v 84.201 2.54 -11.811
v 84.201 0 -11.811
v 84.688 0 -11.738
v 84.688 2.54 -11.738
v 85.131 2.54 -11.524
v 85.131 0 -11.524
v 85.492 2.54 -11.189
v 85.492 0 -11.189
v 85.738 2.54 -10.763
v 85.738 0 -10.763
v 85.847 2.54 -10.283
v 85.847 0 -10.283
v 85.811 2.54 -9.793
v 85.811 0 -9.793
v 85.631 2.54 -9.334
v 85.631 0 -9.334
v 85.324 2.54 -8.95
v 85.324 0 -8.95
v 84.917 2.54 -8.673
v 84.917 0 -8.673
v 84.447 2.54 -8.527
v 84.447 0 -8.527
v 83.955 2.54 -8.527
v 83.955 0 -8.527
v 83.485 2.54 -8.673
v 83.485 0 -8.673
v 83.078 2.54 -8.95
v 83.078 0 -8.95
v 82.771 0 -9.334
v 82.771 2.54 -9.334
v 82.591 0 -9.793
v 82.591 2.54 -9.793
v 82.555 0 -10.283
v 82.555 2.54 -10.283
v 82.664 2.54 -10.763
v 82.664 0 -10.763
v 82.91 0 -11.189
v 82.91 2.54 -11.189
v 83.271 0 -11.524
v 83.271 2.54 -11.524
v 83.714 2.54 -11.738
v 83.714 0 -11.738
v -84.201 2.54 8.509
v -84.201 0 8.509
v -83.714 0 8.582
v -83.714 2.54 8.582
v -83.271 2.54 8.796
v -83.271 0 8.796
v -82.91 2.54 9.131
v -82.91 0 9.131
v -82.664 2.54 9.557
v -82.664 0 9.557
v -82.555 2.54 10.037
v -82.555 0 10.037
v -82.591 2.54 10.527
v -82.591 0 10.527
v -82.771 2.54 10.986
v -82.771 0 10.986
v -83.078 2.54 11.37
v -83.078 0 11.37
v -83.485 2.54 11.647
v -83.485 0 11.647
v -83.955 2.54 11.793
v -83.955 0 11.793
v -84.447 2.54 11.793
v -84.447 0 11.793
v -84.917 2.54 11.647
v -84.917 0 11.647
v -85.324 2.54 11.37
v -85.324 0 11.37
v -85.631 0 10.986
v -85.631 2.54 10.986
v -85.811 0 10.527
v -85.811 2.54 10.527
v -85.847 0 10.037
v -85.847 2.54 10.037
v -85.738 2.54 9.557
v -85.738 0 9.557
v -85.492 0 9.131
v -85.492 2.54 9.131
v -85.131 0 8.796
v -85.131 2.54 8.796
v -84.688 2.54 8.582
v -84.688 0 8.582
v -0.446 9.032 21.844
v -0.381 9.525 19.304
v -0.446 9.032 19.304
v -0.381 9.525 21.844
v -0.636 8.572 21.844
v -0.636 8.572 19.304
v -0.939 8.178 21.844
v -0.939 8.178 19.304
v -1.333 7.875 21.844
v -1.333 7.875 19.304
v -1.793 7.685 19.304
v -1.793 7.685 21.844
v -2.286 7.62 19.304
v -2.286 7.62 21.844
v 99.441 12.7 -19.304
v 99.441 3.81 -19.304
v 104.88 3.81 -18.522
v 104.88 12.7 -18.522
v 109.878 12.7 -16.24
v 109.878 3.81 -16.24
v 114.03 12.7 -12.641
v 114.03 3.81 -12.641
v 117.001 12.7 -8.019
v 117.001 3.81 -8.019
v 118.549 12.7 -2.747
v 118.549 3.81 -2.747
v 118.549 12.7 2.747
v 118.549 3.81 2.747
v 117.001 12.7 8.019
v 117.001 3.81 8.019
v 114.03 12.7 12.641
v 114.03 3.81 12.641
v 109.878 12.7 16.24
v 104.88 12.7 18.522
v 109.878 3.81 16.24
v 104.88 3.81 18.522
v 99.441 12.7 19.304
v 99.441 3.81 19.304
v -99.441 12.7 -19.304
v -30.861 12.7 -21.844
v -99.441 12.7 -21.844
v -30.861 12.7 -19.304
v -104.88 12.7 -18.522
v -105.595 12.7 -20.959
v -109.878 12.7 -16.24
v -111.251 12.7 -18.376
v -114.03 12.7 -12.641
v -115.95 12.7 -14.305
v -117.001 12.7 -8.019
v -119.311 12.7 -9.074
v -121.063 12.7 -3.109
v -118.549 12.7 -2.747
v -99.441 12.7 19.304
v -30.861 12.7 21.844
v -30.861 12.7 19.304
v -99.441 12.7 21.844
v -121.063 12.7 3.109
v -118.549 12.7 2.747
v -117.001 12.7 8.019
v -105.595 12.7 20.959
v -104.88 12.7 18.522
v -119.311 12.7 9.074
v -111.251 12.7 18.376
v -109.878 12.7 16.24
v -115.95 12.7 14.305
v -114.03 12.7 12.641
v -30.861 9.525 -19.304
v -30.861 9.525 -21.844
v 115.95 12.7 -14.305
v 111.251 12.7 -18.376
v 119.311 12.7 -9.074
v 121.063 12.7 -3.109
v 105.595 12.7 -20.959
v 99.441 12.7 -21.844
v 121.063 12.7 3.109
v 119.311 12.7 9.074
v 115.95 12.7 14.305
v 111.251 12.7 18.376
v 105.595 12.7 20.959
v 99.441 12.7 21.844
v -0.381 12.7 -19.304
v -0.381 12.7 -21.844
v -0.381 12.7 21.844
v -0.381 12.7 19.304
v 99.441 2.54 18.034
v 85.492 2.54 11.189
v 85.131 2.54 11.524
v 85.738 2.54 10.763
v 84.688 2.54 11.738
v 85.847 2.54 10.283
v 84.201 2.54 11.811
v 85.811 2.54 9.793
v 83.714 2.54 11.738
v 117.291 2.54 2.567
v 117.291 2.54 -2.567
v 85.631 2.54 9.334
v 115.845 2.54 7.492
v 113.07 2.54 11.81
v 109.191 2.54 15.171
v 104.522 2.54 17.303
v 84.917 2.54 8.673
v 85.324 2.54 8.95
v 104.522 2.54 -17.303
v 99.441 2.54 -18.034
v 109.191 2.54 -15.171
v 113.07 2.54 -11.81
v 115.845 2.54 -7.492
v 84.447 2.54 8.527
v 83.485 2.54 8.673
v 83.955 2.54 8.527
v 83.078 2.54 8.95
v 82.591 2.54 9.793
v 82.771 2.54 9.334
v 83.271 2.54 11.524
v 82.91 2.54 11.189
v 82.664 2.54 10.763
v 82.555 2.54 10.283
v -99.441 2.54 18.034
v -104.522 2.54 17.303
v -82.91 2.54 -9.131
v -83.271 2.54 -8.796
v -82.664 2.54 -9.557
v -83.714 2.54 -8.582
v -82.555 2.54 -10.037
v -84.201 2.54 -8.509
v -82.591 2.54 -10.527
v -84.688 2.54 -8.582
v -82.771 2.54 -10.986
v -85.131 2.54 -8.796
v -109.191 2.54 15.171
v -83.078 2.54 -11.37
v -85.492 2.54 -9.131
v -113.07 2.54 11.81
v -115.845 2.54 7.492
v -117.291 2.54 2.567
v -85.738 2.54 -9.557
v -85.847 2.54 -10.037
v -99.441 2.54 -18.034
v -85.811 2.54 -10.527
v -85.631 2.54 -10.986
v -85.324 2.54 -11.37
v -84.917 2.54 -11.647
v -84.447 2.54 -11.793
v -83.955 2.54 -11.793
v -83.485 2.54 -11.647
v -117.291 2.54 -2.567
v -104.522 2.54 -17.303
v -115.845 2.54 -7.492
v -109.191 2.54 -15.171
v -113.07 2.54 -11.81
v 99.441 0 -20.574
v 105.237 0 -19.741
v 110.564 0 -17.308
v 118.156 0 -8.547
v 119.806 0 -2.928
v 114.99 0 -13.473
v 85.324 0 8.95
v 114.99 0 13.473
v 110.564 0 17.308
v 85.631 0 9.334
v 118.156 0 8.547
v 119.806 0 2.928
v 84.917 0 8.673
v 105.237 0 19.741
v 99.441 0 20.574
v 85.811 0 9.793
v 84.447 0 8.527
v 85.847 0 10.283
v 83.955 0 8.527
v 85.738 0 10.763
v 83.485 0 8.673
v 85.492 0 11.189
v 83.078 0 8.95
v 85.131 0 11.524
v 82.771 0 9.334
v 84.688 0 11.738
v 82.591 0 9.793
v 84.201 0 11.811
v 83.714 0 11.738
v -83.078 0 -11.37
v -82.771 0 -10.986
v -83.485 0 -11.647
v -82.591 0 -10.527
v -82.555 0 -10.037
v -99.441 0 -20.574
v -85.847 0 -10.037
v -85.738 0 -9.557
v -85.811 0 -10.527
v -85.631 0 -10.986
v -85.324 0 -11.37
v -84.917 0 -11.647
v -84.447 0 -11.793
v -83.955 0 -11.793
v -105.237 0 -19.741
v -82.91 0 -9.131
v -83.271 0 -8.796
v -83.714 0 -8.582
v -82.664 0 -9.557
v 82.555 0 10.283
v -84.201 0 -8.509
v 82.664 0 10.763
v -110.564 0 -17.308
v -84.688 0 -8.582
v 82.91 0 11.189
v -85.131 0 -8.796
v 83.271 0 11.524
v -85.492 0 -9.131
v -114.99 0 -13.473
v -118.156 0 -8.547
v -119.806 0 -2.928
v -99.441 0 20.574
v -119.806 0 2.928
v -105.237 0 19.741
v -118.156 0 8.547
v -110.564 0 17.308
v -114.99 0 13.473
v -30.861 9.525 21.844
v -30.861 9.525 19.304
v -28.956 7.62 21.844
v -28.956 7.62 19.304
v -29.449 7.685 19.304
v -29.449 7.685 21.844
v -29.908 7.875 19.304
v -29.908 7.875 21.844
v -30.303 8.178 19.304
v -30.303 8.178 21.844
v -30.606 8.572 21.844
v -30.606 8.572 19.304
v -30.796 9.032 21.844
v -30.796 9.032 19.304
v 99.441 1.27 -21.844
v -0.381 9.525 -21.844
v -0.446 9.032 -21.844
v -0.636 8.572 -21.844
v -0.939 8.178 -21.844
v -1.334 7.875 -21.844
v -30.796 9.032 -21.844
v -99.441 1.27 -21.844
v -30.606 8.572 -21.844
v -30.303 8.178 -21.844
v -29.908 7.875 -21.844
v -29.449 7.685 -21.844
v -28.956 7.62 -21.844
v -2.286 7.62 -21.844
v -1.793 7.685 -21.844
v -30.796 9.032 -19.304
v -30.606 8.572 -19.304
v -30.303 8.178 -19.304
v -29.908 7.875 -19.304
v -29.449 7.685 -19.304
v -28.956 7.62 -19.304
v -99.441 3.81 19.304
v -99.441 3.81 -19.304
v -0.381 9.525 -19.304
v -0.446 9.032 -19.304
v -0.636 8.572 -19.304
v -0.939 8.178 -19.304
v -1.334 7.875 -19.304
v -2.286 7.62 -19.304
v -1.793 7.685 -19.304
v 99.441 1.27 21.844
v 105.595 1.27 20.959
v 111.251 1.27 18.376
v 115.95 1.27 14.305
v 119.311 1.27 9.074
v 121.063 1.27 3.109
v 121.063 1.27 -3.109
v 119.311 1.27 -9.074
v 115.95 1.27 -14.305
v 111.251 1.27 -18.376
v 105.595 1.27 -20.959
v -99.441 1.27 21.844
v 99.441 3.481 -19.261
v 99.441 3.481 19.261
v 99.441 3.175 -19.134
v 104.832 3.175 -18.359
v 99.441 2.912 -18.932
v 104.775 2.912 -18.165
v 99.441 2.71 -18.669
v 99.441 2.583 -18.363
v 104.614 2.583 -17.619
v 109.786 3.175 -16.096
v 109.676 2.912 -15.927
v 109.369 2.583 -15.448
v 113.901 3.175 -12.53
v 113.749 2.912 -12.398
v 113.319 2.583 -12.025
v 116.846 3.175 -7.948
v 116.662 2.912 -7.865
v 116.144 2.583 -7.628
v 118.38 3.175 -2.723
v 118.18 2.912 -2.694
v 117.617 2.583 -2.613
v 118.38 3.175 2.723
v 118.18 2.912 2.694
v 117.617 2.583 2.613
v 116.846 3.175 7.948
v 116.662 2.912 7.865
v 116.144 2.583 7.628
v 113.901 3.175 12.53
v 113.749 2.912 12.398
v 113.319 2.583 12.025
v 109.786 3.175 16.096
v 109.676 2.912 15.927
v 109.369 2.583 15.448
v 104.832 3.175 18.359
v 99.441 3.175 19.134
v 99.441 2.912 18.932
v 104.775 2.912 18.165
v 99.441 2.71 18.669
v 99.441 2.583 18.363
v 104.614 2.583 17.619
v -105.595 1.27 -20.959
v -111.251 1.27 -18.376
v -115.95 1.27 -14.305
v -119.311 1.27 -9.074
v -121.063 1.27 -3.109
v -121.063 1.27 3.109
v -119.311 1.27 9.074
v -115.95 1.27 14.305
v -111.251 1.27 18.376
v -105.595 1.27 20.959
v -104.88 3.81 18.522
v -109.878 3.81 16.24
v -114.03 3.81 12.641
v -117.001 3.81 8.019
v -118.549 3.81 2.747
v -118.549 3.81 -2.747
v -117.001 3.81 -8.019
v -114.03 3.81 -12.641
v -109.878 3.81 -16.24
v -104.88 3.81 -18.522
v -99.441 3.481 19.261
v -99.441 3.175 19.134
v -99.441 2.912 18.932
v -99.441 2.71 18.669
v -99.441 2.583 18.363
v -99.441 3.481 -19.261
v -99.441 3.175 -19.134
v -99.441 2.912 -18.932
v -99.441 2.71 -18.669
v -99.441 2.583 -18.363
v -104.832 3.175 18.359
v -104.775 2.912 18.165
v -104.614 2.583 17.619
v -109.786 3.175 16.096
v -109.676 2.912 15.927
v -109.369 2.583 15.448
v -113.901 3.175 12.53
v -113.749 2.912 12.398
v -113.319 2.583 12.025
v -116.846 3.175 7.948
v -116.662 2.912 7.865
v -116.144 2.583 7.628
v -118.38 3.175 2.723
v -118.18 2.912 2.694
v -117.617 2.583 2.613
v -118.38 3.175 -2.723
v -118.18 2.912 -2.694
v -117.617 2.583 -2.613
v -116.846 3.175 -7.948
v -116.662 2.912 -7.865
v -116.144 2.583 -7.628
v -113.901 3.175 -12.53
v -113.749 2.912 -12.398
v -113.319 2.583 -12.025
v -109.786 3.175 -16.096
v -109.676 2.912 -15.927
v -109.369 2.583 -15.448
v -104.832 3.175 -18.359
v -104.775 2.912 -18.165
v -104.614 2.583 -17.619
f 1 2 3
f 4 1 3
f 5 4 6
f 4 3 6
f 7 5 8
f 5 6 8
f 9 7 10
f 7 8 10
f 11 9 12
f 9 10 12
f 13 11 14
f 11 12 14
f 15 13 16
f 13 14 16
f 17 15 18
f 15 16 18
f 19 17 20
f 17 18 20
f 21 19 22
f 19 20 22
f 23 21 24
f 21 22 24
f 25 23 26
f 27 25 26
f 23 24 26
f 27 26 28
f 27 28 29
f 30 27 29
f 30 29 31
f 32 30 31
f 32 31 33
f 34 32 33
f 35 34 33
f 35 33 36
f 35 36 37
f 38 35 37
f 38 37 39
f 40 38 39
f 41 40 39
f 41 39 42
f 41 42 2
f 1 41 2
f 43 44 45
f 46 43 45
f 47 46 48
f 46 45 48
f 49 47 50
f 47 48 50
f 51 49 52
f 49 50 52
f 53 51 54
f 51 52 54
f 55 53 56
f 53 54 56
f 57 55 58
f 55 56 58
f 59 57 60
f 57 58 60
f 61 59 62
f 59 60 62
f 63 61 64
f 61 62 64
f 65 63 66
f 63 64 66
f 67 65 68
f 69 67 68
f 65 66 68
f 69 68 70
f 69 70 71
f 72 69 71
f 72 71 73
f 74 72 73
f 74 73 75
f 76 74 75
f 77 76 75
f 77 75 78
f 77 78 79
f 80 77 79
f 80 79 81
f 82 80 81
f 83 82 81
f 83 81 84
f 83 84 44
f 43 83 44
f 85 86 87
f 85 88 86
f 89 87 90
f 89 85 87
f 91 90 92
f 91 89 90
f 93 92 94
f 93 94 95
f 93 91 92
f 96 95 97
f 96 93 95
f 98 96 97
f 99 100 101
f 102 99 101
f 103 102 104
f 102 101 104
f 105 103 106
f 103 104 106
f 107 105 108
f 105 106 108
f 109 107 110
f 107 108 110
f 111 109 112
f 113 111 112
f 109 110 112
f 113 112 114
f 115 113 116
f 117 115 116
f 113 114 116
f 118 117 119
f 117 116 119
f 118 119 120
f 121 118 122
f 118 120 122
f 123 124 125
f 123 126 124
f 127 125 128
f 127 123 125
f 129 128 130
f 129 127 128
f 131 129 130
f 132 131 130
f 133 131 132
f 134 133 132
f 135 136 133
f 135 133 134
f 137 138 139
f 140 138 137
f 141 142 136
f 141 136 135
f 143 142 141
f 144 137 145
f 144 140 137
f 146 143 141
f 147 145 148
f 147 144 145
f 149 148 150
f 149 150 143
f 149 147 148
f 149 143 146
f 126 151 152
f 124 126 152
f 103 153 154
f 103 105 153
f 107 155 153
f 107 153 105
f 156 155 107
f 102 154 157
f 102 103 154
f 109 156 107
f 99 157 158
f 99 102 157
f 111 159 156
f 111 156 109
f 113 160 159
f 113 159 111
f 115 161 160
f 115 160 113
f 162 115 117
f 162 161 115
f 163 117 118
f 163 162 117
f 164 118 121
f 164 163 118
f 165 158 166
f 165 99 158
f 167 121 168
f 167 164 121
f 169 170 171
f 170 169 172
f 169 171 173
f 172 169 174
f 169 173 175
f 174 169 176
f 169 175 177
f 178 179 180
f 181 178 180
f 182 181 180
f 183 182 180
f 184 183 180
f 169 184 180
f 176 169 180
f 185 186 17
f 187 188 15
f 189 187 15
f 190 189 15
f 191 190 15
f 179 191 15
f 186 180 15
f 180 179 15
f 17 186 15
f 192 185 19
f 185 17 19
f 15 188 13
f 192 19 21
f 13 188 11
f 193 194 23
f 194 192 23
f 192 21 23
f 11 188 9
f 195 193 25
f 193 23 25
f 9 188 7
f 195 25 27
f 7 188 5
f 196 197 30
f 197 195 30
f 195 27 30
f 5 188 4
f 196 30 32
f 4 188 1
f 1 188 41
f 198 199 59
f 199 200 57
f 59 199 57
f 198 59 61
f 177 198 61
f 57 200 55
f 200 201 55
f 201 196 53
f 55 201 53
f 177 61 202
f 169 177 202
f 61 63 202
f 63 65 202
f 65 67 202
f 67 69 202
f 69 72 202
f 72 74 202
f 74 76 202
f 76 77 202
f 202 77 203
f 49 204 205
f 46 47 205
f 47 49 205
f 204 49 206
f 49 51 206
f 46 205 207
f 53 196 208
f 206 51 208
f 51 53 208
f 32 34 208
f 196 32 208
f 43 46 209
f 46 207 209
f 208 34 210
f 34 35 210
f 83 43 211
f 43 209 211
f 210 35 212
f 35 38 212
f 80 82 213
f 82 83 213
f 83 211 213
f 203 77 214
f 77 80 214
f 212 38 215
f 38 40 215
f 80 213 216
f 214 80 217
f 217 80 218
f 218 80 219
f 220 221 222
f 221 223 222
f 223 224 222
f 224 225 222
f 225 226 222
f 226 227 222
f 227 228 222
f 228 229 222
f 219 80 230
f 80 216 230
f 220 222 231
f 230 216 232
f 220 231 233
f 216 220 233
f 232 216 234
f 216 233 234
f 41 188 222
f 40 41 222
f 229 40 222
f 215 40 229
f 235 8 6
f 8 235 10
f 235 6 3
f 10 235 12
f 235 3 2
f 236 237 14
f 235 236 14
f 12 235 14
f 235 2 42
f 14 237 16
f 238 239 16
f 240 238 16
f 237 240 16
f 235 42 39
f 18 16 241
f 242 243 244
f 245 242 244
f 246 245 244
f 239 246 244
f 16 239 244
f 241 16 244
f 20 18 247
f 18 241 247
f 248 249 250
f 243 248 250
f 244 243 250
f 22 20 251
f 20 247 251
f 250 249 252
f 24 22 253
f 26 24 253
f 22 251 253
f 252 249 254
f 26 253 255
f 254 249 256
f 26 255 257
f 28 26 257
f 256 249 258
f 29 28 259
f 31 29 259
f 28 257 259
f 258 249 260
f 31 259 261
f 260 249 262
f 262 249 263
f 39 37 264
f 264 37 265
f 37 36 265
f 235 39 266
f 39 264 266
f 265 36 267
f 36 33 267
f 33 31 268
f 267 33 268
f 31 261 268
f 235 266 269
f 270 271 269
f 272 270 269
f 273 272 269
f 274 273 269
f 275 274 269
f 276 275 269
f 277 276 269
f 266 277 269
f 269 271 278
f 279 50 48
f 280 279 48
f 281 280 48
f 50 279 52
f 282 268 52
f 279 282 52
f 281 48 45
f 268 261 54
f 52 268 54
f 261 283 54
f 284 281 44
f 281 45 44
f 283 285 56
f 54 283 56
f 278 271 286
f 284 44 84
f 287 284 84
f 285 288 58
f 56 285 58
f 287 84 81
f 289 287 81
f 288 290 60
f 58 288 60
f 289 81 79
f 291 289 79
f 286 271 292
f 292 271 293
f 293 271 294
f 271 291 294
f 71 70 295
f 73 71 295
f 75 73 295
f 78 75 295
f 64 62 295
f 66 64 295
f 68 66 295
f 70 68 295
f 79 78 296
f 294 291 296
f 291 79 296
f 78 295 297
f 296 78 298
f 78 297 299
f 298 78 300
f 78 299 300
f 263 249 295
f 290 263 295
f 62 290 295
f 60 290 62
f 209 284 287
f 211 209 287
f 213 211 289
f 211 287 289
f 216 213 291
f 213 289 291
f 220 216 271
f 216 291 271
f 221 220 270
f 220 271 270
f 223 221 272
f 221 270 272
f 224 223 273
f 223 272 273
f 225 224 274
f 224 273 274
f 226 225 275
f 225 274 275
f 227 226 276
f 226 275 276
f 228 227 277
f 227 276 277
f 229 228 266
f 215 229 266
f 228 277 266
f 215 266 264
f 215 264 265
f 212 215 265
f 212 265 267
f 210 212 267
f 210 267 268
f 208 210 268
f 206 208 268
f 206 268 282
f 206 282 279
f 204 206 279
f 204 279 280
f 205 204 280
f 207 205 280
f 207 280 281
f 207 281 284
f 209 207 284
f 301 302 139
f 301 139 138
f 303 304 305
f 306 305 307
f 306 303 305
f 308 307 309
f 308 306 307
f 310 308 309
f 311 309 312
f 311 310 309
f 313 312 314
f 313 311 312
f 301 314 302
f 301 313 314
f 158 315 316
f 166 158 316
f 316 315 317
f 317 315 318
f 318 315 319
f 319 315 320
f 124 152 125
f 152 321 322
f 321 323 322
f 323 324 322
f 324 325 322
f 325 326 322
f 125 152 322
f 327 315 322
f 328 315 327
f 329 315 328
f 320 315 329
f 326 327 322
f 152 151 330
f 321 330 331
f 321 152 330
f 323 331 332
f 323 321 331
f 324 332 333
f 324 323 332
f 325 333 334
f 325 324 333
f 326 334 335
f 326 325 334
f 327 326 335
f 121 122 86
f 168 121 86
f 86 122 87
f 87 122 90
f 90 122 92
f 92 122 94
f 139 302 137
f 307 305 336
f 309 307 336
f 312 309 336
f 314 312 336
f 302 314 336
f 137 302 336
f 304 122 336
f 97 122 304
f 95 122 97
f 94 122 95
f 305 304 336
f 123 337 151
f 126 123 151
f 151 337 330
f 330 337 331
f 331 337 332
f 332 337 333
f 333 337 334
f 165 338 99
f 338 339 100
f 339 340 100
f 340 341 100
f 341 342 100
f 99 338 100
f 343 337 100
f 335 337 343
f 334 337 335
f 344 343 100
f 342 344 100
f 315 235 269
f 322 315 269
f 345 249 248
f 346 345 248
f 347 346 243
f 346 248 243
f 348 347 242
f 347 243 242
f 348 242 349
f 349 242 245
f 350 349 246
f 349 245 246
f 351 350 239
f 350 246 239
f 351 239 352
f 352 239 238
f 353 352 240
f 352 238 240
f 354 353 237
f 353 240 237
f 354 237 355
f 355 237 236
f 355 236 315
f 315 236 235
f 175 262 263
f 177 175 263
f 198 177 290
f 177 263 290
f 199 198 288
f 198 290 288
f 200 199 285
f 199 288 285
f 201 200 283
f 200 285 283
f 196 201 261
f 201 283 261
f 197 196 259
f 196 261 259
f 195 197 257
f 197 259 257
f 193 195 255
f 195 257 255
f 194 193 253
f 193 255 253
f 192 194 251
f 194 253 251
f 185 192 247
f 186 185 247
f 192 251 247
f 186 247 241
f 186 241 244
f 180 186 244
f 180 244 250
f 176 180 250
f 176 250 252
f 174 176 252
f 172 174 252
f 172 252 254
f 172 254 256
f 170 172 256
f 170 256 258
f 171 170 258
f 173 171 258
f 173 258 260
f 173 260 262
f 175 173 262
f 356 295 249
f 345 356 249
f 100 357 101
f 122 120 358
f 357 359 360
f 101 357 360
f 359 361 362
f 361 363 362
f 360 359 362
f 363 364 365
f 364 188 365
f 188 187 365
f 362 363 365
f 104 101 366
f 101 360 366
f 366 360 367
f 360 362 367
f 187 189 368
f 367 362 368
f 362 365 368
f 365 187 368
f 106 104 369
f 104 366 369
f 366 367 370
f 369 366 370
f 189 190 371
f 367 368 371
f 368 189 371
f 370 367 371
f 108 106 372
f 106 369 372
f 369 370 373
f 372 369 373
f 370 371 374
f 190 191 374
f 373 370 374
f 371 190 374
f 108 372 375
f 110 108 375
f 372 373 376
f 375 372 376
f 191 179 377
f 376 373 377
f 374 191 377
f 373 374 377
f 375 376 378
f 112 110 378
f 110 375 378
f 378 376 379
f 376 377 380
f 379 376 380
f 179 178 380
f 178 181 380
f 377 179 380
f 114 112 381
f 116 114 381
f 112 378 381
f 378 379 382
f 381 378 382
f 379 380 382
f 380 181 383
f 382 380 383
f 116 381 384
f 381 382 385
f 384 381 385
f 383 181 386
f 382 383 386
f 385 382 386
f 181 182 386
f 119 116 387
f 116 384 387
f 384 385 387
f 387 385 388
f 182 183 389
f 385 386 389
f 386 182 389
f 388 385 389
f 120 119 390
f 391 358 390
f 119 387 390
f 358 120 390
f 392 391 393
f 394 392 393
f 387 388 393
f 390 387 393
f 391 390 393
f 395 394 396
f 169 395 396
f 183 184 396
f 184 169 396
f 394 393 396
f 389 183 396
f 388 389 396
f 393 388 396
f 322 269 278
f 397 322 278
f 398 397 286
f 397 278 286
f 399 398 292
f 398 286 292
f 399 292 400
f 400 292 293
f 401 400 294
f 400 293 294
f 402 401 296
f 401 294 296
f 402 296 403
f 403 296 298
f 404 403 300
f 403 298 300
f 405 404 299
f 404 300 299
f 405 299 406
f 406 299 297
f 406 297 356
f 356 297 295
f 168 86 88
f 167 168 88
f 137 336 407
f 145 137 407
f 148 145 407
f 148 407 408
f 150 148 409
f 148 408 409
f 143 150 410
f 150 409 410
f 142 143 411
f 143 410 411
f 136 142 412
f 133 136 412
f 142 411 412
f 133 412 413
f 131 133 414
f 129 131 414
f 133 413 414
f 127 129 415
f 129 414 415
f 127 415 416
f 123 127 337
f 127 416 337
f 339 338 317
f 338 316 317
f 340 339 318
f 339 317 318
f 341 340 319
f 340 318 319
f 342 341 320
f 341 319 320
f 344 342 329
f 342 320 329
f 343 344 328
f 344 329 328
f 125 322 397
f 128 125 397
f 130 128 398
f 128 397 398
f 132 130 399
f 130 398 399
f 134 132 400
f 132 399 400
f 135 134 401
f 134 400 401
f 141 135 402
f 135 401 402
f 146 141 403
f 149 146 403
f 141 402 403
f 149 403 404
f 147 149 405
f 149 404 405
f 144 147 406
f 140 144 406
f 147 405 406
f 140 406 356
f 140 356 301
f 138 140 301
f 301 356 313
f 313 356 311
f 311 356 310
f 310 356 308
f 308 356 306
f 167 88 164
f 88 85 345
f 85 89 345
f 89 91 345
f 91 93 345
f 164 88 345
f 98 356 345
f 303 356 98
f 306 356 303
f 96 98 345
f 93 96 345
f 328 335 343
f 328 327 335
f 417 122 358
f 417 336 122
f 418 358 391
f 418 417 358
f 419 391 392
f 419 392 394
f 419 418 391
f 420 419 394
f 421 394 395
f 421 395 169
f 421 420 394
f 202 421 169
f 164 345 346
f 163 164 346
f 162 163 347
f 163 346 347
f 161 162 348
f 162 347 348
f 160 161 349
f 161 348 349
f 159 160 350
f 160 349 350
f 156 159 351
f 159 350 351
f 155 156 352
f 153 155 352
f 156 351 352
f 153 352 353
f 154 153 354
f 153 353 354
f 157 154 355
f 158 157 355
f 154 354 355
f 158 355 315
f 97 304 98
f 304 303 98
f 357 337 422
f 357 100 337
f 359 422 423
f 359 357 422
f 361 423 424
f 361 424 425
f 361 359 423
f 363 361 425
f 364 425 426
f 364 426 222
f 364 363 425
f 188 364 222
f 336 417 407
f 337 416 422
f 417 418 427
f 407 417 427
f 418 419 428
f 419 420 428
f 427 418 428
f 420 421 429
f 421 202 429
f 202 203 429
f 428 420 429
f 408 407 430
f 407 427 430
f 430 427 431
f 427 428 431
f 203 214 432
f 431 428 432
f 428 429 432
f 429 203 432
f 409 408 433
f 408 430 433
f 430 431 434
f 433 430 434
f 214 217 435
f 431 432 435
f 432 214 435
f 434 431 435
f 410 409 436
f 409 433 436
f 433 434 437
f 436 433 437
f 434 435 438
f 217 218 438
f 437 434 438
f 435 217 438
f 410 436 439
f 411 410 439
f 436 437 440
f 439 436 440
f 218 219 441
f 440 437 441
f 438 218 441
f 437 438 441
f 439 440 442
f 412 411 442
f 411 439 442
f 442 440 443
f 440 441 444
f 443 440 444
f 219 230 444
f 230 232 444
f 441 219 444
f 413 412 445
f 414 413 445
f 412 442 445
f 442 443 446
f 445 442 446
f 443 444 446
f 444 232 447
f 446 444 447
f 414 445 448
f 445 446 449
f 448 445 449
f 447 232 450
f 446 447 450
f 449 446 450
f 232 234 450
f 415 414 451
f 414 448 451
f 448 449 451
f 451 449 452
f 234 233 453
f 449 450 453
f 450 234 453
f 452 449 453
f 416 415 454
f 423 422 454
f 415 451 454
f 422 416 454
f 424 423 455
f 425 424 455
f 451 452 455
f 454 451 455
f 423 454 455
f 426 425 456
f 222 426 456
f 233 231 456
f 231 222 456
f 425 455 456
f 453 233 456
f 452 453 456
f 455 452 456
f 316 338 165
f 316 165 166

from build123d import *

# Parameters (mm, degrees)
MAINBLOCK_DEPTH               = 2.54
BOSS_EXTRUDE1_DEPTH           = 12.7
SKETCH3_R                     = 1.651
MOUNT_HOLES_DEPTH             = 124.889069578
FILLET1_R                     = 1.27
CHAMFER1_SIZE                 = 1.27
SKETCH4_W                     = 30.48
SKETCH4_H                     = 2.54
STABILIZER_MOUNT_CUTOUT_DEPTH = 5.08
FILLET2_R                     = 1.905


with BuildPart() as part:
    # Sketch1 → MainBlock (new body)
    with BuildSketch(Plane(origin=(0, 0, 0), x_dir=(1, 0, 0), z_dir=(0, 1, 0))):
        with BuildLine():
            Line((-99.441, 19.304), (99.441, 19.304))
            ThreePointArc((99.441, 19.304), (118.745, 0), (99.441, -19.304))
            Line((99.441, -19.304), (-99.441, -19.304))
            ThreePointArc((-99.441, -19.304), (-118.745, 0), (-99.441, 19.304))
        make_face()
    extrude(amount=MAINBLOCK_DEPTH)

    # Sketch2 → Boss-Extrude1 (add)
    with BuildSketch(Plane.XZ):
        with BuildLine():
            Line((-99.441, 21.844), (99.441, 21.844))
            ThreePointArc((99.441, 21.844), (121.285, 0), (99.441, -21.844))
            Line((99.441, -21.844), (-99.441, -21.844))
            ThreePointArc((-99.441, -21.844), (-121.285, 0), (-99.441, 21.844))
        make_face()
        with BuildLine():
            Line((99.441, 19.304), (-99.441, 19.304))
            ThreePointArc((-99.441, 19.304), (-118.745, 0), (-99.441, -19.304))
            Line((-99.441, -19.304), (99.441, -19.304))
            ThreePointArc((99.441, -19.304), (118.745, 0), (99.441, 19.304))
        make_face(mode=Mode.SUBTRACT)
    extrude(amount=-BOSS_EXTRUDE1_DEPTH)

    # Sketch3 → Mount-Holes (cut, through all)
    with BuildSketch(Plane.XZ):
        with Locations(Location((-84.201, 10.16, 0), (0, 0, 270))):
            Circle(SKETCH3_R)
        with Locations(Location((84.201, 10.16, 0), (0, 0, 90))):
            Circle(SKETCH3_R)
        with Locations(Location((84.201, -10.16, 0), (0, 0, 270))):
            Circle(SKETCH3_R)
        with Locations(Location((-84.201, -10.16, 0), (0, 0, 90))):
            Circle(SKETCH3_R)
    extrude(amount=-MOUNT_HOLES_DEPTH, mode=Mode.SUBTRACT)

    # Fillet1
    fillet1_edges = [part.edges().sort_by_distance(p)[0] for p in [
        (118.745, 2.54, 0),
        (0, 2.54, -19.304),
        (-118.745, 2.54, 0),
        (0, 2.54, 19.304),
    ]]
    fillet(fillet1_edges, radius=FILLET1_R)

    # Chamfer1
    chamfer1_edges = [part.edges().sort_by_distance(p)[0] for p in [
        (-121.285, 0, 0),
        (0, 0, -21.844),
        (121.285, 0, 0),
        (0, 0, 21.844),
    ]]
    chamfer(chamfer1_edges, length=CHAMFER1_SIZE)

    # Sketch4 → Stabilizer-Mount-Cutout (cut)
    with BuildSketch(Plane(origin=(0, 12.7, 0), x_dir=(1, 0, 0), z_dir=(0, 1, 0))):
        with Locations((-15.621, 20.574)):
            Rectangle(SKETCH4_W, SKETCH4_H)
    stabilizer_mount_cutout = extrude(amount=-STABILIZER_MOUNT_CUTOUT_DEPTH, mode=Mode.SUBTRACT)

    # Mirror1: Stabilizer-Mount-Cutout across plane
    add(stabilizer_mount_cutout.mirror(Plane.XY), mode=Mode.SUBTRACT)

    # Fillet2
    fillet2_edges = [part.edges().sort_by_distance(p)[0] for p in [
        (-30.861, 7.62, 20.574),
        (-0.381, 7.62, 20.574),
        (-0.381, 7.62, -20.574),
        (-30.861, 7.62, -20.574),
    ]]
    fillet(fillet2_edges, radius=FILLET2_R)


solid = part.part
